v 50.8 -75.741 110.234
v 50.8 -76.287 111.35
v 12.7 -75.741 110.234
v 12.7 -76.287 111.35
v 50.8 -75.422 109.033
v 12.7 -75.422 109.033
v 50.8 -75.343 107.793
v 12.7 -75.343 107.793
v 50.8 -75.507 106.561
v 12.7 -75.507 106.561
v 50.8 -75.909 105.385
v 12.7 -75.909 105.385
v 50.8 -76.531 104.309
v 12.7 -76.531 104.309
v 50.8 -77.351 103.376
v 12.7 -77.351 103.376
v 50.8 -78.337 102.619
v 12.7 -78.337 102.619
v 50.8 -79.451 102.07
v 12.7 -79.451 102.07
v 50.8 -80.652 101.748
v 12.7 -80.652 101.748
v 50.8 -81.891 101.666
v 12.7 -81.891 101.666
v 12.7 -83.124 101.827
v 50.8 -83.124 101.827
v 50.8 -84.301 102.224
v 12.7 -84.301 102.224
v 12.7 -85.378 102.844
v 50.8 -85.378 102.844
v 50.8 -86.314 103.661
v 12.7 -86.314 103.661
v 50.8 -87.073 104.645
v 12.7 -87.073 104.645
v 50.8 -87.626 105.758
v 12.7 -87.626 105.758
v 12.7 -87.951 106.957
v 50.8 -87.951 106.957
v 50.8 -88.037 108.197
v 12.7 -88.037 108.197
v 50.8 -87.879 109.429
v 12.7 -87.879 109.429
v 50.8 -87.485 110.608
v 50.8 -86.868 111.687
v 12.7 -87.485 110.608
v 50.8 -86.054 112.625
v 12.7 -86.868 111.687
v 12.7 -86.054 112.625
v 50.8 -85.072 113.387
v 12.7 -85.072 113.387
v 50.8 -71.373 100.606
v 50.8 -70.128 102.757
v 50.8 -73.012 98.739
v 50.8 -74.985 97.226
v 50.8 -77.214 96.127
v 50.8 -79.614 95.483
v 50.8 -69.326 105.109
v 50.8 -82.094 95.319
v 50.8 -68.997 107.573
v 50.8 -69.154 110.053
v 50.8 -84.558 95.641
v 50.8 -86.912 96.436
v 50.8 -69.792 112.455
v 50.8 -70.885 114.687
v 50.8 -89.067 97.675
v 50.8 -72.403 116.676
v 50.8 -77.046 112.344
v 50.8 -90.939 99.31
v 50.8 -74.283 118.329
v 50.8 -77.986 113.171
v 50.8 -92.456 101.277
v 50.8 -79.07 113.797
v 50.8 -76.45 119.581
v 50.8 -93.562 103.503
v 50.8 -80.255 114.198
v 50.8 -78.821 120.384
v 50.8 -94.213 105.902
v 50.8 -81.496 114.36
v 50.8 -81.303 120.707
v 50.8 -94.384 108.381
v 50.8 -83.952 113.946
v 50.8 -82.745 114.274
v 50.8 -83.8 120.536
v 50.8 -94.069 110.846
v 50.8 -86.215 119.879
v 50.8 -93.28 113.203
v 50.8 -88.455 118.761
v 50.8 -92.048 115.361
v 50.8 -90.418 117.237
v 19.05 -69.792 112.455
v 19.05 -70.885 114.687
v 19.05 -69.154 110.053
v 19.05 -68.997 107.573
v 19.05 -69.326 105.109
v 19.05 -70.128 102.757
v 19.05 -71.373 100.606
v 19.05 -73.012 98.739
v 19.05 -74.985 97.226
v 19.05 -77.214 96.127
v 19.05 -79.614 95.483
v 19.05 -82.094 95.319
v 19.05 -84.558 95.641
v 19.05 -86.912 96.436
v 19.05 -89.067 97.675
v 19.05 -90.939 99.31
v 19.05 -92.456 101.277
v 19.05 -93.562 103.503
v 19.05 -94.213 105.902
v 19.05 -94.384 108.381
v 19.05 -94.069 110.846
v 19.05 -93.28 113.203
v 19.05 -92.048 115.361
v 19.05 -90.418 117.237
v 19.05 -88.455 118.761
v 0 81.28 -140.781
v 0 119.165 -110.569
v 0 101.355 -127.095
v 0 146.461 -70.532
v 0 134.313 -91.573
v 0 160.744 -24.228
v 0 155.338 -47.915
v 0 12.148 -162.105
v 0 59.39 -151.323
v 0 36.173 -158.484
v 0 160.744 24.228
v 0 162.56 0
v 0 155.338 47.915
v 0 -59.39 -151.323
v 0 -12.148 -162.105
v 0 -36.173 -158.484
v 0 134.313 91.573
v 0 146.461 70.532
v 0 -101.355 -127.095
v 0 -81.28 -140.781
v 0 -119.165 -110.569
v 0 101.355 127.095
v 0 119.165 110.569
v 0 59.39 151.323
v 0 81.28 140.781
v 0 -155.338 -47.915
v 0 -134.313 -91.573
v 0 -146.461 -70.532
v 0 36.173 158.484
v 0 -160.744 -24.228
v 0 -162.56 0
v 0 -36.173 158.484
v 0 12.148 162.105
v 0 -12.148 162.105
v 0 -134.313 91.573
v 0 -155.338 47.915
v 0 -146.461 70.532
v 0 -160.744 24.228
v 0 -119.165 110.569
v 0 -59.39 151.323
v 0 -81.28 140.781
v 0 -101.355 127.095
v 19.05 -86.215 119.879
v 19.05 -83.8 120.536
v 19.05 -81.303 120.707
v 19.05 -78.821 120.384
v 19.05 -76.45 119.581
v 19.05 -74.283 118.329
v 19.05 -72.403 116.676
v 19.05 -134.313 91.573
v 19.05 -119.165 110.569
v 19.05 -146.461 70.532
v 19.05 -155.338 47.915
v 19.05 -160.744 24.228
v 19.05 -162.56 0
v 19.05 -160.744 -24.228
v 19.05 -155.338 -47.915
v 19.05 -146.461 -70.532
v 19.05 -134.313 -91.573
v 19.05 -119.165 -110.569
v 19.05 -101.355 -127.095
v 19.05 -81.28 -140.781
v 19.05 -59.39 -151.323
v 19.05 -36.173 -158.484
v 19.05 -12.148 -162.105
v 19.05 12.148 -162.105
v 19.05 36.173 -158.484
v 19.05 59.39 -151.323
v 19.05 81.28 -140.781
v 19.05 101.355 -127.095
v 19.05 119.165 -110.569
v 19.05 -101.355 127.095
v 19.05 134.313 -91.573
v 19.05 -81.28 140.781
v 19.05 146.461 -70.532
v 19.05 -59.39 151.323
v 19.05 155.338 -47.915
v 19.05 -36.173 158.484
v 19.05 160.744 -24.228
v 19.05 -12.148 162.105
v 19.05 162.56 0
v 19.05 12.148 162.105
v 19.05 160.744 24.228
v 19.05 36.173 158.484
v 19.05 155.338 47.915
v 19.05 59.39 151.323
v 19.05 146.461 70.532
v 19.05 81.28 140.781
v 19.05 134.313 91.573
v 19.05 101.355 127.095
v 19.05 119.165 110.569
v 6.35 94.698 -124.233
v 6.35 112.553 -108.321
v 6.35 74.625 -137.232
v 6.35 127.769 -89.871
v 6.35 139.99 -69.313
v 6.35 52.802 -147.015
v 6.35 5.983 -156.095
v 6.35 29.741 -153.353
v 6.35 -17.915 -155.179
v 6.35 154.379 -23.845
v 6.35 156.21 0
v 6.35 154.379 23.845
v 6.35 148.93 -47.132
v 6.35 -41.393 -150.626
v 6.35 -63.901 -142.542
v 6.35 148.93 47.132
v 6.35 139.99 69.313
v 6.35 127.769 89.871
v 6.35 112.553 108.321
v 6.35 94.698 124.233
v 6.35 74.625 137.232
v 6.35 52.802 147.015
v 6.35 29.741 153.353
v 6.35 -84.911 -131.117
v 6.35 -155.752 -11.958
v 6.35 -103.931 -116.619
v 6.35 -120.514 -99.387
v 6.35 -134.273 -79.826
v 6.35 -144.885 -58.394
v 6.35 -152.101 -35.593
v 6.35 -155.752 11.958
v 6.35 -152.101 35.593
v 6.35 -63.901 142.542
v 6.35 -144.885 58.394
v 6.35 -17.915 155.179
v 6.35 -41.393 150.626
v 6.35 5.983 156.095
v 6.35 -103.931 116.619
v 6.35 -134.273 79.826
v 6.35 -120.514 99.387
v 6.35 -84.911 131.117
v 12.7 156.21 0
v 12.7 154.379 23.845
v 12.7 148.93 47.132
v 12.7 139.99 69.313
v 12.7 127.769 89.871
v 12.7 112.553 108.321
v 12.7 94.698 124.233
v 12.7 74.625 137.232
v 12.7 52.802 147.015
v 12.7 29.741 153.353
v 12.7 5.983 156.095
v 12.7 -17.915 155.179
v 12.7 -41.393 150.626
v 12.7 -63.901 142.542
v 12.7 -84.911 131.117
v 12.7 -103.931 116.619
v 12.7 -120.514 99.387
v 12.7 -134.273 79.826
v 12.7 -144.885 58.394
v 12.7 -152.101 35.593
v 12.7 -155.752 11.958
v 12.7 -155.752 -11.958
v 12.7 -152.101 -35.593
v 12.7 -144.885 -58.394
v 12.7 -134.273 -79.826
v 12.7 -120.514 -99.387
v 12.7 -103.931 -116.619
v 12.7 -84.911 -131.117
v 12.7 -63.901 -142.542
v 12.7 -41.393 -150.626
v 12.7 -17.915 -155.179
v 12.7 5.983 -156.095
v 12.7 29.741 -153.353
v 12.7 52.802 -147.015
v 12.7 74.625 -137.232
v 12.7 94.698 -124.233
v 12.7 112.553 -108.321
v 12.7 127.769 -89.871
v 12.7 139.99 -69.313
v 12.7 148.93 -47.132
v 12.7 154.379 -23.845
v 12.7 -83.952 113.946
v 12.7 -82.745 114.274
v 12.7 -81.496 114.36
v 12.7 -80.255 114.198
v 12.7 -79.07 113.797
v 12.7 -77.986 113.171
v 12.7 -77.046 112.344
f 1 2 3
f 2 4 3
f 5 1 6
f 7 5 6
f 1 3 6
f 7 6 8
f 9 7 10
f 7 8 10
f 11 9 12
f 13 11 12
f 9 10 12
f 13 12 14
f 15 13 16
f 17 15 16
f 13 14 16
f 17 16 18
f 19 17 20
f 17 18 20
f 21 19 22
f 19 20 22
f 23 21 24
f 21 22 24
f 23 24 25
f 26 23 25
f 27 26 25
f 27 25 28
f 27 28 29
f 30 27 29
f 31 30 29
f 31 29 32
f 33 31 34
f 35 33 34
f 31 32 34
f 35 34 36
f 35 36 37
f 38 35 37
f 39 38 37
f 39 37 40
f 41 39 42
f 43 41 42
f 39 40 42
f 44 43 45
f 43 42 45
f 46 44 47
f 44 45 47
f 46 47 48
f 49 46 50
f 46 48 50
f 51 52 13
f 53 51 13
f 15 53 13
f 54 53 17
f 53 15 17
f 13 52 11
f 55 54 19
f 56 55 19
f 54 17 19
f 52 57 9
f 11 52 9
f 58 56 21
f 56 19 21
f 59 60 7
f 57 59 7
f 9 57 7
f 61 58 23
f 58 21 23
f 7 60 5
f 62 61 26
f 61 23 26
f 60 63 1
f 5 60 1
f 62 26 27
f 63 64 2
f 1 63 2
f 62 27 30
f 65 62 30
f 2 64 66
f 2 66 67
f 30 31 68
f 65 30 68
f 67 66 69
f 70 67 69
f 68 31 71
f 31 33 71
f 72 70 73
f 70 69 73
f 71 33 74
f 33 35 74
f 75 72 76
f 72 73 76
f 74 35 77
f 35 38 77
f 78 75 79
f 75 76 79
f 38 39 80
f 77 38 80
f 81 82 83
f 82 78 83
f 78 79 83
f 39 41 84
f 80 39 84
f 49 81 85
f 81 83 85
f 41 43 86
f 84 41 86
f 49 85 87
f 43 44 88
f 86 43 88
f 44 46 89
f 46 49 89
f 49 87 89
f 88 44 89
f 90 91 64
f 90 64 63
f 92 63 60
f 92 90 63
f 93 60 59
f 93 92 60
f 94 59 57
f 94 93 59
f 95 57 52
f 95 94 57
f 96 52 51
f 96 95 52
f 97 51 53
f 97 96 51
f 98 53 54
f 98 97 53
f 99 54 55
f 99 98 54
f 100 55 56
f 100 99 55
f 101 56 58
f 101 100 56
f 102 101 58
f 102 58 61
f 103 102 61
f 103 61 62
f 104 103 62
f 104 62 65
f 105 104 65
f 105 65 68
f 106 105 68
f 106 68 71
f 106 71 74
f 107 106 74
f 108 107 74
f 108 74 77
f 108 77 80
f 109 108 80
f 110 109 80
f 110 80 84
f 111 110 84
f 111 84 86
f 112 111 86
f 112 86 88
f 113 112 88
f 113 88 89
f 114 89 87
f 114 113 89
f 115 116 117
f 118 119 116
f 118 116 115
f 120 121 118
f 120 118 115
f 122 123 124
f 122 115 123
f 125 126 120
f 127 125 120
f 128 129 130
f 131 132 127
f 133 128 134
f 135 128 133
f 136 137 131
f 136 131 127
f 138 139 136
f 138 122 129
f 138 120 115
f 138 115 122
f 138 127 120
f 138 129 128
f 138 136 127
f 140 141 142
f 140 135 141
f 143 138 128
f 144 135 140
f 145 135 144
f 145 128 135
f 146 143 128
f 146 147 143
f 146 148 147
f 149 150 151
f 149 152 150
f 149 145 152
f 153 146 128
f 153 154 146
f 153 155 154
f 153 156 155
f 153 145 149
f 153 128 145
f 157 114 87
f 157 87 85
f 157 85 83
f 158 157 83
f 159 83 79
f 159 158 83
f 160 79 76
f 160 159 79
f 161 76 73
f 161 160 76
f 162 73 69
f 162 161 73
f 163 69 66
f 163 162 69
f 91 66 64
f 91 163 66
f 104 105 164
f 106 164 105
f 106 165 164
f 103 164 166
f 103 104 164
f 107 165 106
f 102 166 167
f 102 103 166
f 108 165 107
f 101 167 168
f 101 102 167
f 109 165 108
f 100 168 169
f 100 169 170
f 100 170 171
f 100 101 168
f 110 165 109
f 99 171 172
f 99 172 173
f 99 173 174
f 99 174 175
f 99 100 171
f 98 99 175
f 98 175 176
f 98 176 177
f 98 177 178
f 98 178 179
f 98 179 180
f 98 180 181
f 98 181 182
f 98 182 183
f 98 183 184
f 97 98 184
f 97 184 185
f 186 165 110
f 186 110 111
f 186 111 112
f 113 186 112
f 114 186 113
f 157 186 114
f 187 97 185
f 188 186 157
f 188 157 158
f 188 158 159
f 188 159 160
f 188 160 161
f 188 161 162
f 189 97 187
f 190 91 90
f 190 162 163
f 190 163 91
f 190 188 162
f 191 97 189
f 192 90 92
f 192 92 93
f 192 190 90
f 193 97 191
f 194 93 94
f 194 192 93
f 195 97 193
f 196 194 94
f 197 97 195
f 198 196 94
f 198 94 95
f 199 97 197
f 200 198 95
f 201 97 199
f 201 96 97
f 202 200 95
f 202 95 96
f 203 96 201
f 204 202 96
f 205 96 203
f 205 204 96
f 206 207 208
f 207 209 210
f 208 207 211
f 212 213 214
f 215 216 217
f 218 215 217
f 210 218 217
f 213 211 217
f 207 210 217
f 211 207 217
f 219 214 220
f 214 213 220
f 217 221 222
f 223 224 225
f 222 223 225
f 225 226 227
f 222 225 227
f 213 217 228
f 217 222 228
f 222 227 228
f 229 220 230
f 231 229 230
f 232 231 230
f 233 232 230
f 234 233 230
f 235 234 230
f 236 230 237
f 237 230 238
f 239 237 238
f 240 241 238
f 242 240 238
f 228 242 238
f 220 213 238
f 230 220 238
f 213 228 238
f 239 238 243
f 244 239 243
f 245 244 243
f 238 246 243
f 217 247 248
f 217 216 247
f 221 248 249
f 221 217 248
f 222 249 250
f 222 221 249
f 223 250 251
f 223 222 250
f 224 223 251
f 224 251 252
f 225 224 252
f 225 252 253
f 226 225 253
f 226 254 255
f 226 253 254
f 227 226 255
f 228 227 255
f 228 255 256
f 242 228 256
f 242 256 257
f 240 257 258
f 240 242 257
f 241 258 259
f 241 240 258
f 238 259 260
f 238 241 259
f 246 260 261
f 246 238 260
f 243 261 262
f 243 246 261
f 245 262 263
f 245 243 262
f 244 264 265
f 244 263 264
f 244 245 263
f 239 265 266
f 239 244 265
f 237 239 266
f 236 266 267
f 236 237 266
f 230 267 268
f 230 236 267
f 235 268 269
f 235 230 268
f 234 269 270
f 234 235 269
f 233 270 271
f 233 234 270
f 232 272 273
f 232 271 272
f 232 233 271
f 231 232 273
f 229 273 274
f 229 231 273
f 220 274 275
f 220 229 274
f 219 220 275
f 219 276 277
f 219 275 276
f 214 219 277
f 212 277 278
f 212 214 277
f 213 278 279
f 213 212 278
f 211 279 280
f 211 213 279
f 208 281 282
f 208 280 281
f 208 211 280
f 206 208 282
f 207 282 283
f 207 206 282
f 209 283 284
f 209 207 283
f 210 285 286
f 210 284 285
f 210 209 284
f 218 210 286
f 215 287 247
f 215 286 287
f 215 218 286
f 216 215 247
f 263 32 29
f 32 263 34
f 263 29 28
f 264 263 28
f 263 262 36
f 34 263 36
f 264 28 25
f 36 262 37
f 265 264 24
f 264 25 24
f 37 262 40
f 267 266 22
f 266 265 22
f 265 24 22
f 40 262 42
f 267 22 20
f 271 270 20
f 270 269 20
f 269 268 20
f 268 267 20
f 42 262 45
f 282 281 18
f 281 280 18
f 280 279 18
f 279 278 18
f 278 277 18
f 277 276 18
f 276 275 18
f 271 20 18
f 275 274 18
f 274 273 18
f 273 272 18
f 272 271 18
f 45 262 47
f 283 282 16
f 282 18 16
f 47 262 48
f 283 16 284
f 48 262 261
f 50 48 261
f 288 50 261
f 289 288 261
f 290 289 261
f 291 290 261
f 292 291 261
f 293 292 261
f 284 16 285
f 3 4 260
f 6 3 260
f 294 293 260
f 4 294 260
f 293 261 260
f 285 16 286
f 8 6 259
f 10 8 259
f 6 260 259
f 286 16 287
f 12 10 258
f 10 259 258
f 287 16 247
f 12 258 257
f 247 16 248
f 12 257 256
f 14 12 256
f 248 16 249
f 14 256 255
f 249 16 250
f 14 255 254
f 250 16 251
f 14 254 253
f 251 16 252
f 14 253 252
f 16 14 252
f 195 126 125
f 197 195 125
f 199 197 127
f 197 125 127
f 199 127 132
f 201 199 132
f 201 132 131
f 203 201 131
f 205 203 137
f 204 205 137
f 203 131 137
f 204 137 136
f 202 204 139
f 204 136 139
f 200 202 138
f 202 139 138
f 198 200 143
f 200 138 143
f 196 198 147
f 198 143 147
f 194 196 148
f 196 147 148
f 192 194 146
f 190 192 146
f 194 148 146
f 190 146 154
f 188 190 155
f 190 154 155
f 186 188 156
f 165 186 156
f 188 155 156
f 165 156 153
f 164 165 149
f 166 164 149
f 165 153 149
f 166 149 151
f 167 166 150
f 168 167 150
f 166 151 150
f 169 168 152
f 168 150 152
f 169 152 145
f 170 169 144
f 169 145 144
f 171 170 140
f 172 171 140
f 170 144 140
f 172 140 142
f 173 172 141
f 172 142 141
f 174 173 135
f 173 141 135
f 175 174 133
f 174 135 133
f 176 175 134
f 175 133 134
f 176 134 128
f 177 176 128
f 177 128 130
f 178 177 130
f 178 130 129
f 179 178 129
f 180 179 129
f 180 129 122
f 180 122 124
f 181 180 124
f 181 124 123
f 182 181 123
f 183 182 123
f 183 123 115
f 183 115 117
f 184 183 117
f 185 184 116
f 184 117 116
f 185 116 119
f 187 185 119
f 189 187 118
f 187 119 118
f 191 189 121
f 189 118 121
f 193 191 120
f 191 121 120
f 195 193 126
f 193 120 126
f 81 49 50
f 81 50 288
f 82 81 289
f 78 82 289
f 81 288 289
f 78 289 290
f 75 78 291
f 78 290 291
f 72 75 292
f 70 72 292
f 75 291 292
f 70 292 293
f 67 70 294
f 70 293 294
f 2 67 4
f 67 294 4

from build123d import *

# Parameters (mm, degrees)
F0_R     = 162.56
F1_DEPTH = 19.05
F4_DEPTH = 50.8
F7_T     = -6.35


# Not quite as in the source:
# - the program builds the solid bodies; features that only make, move or delete a surface that nothing else refers to are left out


with BuildPart() as f1:
    # F0 (on Right) → F1 (new body)
    with BuildSketch(Plane.YZ):
        Circle(F0_R)
    extrude(amount=F1_DEPTH)

    # F3 (on face) → F4 (join)
    with BuildSketch(Plane(origin=(0, 0, 0), x_dir=(0, -1, 0), z_dir=(-1, 0, 0))):
        with BuildLine():
            ThreePointArc((88.4545554599, 118.760558867), (78.8208582967, 120.384258227), (70.884610199, 114.6868476944))
            ThreePointArc((70.884610199, 114.6868476944), (84.557836343, 95.6406311102), (88.4545554599, 118.760558867))
        make_face()
    extrude(amount=-F4_DEPTH)

    # F7
    f7_openings = [f1.faces().sort_by_distance(p)[0] for p in [
        (50.8, -81.689347, 108.012445),
    ]]
    offset(amount=F7_T, openings=f7_openings, kind=Kind.INTERSECTION)


solid = f1.part
